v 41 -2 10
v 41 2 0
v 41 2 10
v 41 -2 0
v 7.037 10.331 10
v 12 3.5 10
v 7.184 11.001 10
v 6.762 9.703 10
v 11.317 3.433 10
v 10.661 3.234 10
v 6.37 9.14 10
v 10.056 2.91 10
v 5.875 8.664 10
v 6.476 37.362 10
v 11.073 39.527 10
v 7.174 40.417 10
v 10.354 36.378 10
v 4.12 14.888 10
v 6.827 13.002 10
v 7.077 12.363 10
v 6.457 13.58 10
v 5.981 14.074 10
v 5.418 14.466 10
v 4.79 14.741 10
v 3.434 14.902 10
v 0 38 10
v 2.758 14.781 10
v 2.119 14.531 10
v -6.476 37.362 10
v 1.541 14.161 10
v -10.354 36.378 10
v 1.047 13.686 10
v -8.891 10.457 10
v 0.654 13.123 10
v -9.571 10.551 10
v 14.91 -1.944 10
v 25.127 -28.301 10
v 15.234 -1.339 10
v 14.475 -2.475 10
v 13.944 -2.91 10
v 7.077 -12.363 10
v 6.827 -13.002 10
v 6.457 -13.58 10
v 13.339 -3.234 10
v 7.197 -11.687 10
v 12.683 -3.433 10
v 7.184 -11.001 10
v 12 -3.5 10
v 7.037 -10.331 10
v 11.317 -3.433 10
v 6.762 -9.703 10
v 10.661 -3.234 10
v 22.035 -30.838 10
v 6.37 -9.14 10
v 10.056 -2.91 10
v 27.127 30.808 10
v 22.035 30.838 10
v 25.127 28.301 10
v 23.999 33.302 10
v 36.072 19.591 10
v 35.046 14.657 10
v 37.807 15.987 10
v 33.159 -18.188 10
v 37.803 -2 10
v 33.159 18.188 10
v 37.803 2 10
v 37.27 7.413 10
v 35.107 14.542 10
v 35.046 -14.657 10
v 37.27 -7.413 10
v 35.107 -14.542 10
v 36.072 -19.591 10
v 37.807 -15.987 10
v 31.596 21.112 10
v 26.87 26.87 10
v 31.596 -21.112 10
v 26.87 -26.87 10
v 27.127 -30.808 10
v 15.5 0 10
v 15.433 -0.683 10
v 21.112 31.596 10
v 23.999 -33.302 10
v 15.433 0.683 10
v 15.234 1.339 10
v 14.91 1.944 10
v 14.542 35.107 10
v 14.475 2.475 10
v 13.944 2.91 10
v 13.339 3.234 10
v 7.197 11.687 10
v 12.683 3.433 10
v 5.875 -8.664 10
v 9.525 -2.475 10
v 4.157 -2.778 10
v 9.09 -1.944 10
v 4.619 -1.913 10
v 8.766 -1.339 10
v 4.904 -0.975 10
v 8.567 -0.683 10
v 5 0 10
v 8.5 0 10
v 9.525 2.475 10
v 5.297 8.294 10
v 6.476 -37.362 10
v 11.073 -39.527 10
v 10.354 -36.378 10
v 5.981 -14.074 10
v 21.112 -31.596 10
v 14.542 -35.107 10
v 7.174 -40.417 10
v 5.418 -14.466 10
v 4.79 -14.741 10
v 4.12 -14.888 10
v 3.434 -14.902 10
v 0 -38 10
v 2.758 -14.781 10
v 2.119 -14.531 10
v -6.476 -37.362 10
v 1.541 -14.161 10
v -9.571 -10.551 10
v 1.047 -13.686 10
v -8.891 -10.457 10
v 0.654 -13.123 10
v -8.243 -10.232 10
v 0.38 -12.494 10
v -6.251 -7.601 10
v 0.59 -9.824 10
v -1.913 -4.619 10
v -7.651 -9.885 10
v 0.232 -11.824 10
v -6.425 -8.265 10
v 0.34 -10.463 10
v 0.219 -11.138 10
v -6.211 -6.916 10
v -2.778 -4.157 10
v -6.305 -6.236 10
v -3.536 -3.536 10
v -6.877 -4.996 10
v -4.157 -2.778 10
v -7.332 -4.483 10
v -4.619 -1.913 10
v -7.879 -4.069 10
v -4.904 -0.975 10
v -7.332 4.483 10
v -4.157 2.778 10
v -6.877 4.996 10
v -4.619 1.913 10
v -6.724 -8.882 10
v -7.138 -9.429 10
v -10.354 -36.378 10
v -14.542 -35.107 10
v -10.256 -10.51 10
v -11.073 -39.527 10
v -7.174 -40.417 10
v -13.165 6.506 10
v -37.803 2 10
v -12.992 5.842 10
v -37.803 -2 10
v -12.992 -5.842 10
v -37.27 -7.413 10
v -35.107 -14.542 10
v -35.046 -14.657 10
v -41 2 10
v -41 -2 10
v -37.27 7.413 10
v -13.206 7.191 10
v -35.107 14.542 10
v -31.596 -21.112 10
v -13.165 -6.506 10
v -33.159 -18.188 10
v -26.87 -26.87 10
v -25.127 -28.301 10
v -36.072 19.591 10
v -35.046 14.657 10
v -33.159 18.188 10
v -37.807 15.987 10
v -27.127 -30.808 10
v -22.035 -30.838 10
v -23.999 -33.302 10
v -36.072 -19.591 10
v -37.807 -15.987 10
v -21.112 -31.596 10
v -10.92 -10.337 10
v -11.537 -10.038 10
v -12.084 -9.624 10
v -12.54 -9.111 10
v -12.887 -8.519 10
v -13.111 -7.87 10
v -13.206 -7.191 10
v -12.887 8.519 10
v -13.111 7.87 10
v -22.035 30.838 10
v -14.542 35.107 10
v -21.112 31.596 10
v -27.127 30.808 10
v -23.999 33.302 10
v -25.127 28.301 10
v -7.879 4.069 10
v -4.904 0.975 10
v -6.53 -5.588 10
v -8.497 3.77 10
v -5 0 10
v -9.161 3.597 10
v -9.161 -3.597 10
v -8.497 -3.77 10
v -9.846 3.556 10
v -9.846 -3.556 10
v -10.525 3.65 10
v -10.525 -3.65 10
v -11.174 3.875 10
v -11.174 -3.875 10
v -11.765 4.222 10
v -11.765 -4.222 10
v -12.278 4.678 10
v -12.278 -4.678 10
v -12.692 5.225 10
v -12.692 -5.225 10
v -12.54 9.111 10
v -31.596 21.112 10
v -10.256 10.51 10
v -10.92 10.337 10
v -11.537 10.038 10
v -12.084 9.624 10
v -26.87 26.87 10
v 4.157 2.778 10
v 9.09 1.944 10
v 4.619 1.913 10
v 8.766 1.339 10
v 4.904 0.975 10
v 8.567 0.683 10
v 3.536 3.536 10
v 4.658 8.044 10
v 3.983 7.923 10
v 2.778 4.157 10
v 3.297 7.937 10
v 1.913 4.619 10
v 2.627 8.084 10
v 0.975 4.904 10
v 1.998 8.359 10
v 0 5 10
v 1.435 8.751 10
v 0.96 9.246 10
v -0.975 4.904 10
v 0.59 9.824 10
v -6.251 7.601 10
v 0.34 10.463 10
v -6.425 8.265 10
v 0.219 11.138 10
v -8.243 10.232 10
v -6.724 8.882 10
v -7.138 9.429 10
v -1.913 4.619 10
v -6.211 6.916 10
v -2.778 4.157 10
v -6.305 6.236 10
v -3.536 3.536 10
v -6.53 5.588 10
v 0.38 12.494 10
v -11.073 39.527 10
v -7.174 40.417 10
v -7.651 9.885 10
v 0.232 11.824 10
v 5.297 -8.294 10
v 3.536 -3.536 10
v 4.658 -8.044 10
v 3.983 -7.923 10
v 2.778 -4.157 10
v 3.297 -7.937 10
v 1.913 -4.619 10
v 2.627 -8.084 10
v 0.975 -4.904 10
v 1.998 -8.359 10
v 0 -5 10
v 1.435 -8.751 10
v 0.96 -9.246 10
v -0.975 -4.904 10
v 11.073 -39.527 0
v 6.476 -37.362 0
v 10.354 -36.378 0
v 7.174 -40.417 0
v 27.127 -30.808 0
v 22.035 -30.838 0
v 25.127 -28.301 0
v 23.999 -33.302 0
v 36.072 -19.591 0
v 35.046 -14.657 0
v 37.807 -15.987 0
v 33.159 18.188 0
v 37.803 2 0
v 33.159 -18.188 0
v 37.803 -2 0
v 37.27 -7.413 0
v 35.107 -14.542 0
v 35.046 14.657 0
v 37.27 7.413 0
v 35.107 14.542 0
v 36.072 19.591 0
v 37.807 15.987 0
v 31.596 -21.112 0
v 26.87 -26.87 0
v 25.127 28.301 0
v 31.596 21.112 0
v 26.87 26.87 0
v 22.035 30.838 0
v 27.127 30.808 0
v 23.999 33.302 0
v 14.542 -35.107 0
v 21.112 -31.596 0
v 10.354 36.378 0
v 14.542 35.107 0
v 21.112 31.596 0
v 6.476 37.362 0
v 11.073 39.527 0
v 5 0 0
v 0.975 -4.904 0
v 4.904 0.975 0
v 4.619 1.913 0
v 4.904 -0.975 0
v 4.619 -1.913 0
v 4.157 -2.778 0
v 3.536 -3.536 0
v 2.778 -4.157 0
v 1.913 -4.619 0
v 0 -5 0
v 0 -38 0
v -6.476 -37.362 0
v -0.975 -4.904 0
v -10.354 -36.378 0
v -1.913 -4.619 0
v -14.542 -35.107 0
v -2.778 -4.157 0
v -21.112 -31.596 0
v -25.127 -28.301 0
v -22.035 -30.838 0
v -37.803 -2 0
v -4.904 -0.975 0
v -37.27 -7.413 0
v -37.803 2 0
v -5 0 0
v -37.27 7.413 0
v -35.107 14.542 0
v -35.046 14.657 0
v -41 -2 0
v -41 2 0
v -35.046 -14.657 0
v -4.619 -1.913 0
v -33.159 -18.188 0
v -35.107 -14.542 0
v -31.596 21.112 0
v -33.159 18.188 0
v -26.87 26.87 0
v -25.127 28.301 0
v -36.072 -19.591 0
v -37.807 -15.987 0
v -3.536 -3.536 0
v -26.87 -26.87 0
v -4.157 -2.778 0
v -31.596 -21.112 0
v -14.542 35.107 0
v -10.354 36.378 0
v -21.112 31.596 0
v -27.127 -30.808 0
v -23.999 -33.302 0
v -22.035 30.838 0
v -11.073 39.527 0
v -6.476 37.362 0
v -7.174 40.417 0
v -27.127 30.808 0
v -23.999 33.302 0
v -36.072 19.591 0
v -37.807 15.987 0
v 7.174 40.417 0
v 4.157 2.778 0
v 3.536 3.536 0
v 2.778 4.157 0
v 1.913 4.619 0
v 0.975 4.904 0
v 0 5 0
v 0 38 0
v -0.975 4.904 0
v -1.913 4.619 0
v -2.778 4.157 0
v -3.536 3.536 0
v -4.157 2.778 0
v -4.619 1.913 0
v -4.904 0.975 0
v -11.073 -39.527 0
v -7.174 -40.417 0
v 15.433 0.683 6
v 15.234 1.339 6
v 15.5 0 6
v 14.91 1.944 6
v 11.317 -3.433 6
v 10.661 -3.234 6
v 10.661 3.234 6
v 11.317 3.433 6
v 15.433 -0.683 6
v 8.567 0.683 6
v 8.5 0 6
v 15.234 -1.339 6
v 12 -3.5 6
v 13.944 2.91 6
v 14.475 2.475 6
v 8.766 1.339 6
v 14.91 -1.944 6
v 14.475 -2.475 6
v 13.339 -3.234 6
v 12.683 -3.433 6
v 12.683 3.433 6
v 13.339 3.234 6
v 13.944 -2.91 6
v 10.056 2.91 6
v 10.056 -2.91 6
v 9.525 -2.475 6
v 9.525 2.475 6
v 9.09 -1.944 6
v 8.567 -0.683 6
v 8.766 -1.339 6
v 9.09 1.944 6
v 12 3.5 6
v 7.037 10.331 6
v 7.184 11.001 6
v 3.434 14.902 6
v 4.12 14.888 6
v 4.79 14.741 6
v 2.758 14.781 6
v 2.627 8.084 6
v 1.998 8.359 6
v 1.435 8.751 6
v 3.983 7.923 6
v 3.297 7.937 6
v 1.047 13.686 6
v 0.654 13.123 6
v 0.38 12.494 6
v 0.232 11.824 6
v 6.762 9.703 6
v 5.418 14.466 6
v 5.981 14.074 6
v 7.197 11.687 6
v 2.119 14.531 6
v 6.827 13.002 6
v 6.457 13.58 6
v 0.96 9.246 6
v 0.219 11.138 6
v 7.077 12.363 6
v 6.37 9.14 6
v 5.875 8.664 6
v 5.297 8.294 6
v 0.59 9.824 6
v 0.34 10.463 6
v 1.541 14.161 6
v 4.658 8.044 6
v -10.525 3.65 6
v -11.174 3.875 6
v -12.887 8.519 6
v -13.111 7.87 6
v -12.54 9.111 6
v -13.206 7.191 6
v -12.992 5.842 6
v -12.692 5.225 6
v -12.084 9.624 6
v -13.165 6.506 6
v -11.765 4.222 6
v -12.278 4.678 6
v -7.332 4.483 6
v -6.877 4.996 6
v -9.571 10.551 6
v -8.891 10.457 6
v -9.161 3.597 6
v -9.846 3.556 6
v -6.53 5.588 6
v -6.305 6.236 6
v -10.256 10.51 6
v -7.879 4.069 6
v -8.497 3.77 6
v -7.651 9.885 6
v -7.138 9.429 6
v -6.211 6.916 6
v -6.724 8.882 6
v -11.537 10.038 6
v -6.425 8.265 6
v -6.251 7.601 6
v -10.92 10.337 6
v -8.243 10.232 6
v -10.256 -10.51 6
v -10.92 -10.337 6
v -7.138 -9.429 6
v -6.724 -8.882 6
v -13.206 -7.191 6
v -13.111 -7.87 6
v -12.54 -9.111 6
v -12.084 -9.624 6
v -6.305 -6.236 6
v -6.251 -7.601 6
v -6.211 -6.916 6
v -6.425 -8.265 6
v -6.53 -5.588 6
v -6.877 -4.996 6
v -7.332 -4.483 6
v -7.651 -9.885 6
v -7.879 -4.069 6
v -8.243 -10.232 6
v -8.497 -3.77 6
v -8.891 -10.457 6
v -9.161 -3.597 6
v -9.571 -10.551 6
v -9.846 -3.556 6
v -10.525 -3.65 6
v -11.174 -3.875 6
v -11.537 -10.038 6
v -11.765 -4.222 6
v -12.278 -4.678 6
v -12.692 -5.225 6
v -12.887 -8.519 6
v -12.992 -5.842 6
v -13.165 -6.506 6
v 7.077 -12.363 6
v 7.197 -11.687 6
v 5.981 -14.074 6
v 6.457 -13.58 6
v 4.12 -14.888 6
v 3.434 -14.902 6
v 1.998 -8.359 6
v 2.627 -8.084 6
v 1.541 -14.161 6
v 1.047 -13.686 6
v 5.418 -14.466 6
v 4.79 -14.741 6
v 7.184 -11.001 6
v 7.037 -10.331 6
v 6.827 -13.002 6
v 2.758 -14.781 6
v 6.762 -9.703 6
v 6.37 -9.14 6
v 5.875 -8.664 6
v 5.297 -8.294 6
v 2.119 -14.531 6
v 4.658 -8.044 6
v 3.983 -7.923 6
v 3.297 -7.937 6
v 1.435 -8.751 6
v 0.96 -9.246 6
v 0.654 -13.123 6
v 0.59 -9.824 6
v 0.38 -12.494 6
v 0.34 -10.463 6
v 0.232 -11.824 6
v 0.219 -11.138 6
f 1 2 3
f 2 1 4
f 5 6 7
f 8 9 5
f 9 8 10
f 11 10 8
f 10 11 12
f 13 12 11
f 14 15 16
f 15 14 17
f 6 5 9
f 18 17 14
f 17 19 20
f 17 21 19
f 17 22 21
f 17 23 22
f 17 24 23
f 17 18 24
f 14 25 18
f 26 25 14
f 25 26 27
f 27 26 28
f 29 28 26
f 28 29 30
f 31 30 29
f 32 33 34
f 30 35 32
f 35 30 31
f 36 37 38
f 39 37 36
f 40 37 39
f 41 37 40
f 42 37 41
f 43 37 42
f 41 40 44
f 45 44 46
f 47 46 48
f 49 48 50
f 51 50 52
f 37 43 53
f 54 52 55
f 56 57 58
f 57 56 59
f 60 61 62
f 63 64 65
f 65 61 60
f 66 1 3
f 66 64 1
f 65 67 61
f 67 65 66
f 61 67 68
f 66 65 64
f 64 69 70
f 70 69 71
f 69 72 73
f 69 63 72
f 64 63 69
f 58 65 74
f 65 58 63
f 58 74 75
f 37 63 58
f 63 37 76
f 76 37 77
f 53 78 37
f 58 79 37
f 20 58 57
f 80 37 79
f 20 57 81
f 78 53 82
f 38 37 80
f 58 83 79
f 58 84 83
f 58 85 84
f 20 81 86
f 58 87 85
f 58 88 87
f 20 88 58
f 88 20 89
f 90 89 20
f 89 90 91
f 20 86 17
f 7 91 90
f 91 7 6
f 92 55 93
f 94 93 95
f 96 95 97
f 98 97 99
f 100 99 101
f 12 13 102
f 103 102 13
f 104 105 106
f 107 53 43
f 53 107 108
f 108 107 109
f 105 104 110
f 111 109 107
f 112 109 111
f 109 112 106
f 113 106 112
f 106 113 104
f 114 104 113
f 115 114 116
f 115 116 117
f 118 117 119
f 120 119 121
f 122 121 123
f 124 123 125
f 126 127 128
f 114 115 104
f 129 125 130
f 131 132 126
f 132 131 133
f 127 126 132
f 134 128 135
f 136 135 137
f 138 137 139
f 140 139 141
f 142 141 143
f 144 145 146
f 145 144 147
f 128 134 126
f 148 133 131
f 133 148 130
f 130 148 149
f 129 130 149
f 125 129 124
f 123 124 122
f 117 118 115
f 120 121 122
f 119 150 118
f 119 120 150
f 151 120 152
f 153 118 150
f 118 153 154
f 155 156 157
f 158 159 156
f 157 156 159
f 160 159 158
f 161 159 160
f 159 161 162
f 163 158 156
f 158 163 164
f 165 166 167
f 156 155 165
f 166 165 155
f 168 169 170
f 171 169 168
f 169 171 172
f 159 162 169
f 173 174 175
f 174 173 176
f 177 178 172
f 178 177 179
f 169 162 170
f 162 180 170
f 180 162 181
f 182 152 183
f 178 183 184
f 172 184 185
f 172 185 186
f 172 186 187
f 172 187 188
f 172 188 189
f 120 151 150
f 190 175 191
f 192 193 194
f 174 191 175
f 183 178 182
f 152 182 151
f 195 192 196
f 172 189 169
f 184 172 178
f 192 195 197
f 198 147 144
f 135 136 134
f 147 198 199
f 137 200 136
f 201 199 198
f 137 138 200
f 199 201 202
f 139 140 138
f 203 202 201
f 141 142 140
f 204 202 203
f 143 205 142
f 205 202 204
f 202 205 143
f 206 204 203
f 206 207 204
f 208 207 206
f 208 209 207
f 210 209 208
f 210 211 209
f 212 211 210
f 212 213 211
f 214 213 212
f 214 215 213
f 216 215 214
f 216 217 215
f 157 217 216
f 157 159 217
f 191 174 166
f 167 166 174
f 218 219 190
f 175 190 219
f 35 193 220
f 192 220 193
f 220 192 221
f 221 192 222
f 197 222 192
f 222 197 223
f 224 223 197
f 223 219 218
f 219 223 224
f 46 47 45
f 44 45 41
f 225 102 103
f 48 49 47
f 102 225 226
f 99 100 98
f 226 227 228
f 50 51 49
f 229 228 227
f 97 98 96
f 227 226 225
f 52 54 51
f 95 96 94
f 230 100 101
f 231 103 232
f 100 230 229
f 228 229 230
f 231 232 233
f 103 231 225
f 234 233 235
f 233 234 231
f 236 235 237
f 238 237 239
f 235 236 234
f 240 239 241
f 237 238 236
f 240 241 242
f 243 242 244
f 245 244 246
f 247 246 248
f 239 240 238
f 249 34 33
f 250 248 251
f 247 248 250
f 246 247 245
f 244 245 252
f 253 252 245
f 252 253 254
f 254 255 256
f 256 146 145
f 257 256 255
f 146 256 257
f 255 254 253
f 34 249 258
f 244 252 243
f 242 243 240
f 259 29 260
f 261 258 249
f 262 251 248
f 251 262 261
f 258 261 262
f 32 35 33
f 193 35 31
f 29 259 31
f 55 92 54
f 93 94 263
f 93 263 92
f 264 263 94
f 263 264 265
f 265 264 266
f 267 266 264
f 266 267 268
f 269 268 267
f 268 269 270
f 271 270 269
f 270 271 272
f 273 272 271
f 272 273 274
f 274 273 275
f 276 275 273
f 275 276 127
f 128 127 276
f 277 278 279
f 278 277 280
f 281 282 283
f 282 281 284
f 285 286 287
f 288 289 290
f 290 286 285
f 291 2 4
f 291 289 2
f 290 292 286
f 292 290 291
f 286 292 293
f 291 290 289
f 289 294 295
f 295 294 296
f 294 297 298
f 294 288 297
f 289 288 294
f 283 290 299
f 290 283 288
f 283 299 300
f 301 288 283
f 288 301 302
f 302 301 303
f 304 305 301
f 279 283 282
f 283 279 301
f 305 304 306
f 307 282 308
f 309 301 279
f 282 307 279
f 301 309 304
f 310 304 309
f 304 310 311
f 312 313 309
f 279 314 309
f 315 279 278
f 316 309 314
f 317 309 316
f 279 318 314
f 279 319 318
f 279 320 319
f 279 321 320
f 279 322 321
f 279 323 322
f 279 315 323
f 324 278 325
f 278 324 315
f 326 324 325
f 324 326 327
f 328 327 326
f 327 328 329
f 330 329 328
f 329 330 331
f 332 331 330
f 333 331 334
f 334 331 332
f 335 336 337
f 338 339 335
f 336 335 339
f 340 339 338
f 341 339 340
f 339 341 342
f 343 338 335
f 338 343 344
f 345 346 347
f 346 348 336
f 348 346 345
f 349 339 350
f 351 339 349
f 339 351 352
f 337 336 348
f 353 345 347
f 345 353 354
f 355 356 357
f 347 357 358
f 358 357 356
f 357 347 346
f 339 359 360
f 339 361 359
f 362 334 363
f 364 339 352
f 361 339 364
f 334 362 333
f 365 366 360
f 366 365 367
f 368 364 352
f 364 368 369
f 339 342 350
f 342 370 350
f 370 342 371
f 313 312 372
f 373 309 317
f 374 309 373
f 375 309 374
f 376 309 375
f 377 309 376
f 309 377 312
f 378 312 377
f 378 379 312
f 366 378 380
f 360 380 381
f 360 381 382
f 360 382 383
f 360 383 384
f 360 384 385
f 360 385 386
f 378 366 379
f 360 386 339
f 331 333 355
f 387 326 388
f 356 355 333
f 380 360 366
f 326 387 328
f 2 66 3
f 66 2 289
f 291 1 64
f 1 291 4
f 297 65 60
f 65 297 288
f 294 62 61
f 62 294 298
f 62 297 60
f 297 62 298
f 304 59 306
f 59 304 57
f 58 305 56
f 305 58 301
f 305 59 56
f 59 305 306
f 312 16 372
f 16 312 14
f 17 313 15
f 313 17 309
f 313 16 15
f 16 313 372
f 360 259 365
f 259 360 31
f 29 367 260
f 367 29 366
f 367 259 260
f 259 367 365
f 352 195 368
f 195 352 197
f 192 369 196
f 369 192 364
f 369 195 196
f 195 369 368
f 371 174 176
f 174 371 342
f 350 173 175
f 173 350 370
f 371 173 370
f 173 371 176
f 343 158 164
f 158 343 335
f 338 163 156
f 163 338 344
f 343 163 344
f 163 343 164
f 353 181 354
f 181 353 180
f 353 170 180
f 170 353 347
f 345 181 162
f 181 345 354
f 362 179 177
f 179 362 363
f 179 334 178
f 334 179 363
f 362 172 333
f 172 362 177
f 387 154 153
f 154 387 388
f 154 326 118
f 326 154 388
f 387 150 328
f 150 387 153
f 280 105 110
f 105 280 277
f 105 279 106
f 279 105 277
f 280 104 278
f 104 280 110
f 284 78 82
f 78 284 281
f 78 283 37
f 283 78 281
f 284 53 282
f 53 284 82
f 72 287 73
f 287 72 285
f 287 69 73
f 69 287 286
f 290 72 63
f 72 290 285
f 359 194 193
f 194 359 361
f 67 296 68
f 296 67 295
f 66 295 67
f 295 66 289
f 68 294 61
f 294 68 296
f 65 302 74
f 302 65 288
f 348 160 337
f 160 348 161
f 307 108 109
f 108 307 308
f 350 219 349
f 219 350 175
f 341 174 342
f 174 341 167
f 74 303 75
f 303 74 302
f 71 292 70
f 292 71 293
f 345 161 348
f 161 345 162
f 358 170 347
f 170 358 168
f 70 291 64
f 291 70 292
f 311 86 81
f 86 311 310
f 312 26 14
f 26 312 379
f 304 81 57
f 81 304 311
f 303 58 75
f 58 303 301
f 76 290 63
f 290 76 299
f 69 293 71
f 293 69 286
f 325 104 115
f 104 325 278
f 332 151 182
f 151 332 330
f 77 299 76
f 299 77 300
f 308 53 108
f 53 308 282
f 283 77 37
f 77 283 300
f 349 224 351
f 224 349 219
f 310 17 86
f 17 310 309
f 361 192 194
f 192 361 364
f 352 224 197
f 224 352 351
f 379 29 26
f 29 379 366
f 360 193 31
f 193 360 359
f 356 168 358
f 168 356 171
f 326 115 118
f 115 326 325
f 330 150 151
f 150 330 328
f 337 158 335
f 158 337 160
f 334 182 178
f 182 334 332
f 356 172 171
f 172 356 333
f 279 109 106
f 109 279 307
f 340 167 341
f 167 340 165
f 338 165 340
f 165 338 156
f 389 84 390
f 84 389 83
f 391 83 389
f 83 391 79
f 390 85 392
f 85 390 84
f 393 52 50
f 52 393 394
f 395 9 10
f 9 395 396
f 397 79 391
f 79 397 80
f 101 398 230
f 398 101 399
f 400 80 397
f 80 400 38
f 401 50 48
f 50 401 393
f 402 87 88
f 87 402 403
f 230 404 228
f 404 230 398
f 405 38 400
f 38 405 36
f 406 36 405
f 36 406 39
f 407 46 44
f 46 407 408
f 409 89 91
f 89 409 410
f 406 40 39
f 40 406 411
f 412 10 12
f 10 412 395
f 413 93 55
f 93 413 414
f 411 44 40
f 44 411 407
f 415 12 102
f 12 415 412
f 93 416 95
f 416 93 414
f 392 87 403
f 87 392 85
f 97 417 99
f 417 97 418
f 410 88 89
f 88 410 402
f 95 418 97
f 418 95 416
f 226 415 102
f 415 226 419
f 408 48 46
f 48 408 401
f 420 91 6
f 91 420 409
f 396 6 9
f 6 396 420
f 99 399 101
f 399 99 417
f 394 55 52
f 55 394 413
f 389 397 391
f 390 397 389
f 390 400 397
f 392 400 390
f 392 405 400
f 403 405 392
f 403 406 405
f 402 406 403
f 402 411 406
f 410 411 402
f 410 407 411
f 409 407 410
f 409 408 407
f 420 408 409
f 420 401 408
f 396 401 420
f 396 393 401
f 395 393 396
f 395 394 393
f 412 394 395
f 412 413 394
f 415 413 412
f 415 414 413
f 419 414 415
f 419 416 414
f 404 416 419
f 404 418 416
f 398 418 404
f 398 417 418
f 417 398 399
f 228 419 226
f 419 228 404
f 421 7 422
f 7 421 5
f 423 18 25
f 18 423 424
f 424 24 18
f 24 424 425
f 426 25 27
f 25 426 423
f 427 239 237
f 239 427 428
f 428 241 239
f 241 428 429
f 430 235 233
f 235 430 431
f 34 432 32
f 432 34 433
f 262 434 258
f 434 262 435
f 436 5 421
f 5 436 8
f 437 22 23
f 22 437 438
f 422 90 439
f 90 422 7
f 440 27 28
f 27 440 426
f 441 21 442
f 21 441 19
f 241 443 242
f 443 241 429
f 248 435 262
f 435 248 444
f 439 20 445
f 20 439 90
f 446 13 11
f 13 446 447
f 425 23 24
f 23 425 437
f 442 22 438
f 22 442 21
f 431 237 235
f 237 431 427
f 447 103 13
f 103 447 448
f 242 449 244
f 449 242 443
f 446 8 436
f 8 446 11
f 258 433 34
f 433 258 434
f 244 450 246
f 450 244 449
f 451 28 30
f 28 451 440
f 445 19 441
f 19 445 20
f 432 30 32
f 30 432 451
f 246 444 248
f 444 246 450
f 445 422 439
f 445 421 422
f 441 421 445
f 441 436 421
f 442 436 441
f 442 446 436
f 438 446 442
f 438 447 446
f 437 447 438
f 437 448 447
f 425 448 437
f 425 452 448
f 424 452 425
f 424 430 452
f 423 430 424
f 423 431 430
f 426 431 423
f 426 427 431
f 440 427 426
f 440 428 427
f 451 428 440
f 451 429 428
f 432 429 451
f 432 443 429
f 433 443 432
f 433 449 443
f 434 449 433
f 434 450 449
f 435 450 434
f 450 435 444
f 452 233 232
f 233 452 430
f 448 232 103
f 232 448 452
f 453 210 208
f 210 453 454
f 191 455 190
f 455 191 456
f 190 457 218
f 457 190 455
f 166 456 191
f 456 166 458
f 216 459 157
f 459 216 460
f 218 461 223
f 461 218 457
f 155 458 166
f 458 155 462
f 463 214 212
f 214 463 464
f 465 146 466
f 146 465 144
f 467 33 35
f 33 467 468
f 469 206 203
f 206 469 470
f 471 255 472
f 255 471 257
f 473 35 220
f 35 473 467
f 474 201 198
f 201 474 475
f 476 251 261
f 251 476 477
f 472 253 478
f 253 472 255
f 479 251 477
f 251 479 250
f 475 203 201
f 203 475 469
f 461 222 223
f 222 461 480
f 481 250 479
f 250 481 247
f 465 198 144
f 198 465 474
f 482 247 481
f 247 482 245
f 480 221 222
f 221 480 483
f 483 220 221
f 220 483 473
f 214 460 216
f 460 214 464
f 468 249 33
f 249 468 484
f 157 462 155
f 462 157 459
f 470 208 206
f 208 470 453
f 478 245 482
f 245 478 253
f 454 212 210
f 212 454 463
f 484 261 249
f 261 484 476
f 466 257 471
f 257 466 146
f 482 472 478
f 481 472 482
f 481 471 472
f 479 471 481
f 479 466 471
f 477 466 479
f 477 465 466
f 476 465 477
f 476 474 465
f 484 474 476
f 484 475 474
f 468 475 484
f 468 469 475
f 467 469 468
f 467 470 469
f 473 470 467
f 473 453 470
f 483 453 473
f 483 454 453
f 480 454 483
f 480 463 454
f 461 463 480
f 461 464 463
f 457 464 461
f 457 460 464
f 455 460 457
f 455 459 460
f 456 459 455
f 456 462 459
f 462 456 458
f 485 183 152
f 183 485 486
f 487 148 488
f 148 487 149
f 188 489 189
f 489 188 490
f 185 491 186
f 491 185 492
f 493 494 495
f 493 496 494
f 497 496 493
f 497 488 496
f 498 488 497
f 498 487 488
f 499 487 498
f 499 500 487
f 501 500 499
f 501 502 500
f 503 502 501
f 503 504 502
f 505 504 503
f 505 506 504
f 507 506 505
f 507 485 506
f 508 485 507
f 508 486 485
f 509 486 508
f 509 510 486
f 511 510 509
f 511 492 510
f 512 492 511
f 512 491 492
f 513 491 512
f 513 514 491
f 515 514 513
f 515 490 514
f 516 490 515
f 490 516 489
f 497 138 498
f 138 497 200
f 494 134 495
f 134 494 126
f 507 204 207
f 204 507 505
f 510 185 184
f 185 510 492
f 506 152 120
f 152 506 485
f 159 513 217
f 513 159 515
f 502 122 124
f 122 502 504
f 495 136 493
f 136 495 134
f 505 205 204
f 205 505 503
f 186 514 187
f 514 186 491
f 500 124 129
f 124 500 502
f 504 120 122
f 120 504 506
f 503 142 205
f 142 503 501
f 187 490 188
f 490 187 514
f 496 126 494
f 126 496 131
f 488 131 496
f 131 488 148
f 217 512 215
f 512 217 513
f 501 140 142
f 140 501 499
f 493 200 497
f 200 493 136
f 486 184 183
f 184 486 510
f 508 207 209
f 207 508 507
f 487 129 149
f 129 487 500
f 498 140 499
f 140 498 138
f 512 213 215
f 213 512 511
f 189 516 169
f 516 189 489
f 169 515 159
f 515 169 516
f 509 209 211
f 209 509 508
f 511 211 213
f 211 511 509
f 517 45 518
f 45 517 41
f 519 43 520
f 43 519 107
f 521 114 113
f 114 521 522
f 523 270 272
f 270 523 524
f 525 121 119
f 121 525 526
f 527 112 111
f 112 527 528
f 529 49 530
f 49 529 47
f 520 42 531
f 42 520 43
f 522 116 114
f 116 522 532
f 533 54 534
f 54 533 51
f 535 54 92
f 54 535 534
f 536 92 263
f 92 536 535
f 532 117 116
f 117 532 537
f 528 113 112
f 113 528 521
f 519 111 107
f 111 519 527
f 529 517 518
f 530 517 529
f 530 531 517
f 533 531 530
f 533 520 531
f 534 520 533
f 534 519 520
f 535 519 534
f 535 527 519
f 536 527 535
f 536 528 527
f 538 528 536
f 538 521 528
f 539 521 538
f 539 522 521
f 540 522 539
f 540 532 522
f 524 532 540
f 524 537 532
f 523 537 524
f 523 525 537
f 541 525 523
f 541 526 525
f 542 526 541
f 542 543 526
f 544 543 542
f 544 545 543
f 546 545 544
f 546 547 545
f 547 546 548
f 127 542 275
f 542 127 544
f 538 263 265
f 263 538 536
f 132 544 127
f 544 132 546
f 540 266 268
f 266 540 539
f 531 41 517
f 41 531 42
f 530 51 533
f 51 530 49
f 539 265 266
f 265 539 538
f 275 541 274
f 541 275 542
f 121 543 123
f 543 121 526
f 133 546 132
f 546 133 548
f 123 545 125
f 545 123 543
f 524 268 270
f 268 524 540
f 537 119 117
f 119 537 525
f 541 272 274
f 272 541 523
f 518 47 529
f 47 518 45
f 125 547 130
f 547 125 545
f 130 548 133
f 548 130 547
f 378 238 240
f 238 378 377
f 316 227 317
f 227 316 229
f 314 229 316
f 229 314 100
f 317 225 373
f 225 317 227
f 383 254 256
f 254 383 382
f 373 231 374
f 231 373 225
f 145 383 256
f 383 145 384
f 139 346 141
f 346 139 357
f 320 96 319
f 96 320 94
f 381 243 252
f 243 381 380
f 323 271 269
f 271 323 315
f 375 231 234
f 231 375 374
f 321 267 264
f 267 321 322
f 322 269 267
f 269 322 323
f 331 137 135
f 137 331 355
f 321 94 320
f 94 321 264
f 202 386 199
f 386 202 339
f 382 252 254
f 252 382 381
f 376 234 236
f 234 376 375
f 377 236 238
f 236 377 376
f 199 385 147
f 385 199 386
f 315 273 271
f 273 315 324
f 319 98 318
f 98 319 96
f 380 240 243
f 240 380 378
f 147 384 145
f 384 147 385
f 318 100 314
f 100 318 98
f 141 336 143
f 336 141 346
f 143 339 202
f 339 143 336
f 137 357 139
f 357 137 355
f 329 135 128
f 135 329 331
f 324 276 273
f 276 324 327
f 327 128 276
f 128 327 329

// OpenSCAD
$fn = 32;

// ----------------------------------------------------------------------
// Spur blank: lightened gear blank
// ----------------------------------------------------------------------

// --- parameters (mm) ---
disc_r = 38;              // blank root radius
disc_t = 10;              // blank thickness
n_teeth = 14;             // stub tooth count
tooth_w = 4;              // tooth width at the root
tooth_h = 3;              // tooth height above the root
bore_r = 5;               // central bore radius
ring_r = 12;              // lightening pocket ring radius
pocket_r = 3.5;           // lightening pocket radius
fit_tol = 0.05;           // tolerance for press fits, mm
free_tol = 0.2;           // tolerance for clearance fits, mm

out_r = disc_r + tooth_h;  // tip radius
bbox_x = 82.0;  // measured width over the teeth
bbox_y = 80.83;  // measured depth over the teeth

difference() {
union() {
  cylinder(r = disc_r, h = disc_t);
  for (i = [0 : n_teeth - 1])
    rotate([0, 0, i * 360 / n_teeth])
      translate([disc_r - 1, -tooth_w / 2, 0])
        cube([tooth_h + 1, tooth_w, disc_t]);
}
  translate([0, 0, -1]) cylinder(r = bore_r, h = disc_t + 2);
  for (i = [0 : 5])
    rotate([0, 0, i * 72])
      translate([ring_r, 0, disc_t - 4])
        cylinder(r = pocket_r, h = 5);
}
